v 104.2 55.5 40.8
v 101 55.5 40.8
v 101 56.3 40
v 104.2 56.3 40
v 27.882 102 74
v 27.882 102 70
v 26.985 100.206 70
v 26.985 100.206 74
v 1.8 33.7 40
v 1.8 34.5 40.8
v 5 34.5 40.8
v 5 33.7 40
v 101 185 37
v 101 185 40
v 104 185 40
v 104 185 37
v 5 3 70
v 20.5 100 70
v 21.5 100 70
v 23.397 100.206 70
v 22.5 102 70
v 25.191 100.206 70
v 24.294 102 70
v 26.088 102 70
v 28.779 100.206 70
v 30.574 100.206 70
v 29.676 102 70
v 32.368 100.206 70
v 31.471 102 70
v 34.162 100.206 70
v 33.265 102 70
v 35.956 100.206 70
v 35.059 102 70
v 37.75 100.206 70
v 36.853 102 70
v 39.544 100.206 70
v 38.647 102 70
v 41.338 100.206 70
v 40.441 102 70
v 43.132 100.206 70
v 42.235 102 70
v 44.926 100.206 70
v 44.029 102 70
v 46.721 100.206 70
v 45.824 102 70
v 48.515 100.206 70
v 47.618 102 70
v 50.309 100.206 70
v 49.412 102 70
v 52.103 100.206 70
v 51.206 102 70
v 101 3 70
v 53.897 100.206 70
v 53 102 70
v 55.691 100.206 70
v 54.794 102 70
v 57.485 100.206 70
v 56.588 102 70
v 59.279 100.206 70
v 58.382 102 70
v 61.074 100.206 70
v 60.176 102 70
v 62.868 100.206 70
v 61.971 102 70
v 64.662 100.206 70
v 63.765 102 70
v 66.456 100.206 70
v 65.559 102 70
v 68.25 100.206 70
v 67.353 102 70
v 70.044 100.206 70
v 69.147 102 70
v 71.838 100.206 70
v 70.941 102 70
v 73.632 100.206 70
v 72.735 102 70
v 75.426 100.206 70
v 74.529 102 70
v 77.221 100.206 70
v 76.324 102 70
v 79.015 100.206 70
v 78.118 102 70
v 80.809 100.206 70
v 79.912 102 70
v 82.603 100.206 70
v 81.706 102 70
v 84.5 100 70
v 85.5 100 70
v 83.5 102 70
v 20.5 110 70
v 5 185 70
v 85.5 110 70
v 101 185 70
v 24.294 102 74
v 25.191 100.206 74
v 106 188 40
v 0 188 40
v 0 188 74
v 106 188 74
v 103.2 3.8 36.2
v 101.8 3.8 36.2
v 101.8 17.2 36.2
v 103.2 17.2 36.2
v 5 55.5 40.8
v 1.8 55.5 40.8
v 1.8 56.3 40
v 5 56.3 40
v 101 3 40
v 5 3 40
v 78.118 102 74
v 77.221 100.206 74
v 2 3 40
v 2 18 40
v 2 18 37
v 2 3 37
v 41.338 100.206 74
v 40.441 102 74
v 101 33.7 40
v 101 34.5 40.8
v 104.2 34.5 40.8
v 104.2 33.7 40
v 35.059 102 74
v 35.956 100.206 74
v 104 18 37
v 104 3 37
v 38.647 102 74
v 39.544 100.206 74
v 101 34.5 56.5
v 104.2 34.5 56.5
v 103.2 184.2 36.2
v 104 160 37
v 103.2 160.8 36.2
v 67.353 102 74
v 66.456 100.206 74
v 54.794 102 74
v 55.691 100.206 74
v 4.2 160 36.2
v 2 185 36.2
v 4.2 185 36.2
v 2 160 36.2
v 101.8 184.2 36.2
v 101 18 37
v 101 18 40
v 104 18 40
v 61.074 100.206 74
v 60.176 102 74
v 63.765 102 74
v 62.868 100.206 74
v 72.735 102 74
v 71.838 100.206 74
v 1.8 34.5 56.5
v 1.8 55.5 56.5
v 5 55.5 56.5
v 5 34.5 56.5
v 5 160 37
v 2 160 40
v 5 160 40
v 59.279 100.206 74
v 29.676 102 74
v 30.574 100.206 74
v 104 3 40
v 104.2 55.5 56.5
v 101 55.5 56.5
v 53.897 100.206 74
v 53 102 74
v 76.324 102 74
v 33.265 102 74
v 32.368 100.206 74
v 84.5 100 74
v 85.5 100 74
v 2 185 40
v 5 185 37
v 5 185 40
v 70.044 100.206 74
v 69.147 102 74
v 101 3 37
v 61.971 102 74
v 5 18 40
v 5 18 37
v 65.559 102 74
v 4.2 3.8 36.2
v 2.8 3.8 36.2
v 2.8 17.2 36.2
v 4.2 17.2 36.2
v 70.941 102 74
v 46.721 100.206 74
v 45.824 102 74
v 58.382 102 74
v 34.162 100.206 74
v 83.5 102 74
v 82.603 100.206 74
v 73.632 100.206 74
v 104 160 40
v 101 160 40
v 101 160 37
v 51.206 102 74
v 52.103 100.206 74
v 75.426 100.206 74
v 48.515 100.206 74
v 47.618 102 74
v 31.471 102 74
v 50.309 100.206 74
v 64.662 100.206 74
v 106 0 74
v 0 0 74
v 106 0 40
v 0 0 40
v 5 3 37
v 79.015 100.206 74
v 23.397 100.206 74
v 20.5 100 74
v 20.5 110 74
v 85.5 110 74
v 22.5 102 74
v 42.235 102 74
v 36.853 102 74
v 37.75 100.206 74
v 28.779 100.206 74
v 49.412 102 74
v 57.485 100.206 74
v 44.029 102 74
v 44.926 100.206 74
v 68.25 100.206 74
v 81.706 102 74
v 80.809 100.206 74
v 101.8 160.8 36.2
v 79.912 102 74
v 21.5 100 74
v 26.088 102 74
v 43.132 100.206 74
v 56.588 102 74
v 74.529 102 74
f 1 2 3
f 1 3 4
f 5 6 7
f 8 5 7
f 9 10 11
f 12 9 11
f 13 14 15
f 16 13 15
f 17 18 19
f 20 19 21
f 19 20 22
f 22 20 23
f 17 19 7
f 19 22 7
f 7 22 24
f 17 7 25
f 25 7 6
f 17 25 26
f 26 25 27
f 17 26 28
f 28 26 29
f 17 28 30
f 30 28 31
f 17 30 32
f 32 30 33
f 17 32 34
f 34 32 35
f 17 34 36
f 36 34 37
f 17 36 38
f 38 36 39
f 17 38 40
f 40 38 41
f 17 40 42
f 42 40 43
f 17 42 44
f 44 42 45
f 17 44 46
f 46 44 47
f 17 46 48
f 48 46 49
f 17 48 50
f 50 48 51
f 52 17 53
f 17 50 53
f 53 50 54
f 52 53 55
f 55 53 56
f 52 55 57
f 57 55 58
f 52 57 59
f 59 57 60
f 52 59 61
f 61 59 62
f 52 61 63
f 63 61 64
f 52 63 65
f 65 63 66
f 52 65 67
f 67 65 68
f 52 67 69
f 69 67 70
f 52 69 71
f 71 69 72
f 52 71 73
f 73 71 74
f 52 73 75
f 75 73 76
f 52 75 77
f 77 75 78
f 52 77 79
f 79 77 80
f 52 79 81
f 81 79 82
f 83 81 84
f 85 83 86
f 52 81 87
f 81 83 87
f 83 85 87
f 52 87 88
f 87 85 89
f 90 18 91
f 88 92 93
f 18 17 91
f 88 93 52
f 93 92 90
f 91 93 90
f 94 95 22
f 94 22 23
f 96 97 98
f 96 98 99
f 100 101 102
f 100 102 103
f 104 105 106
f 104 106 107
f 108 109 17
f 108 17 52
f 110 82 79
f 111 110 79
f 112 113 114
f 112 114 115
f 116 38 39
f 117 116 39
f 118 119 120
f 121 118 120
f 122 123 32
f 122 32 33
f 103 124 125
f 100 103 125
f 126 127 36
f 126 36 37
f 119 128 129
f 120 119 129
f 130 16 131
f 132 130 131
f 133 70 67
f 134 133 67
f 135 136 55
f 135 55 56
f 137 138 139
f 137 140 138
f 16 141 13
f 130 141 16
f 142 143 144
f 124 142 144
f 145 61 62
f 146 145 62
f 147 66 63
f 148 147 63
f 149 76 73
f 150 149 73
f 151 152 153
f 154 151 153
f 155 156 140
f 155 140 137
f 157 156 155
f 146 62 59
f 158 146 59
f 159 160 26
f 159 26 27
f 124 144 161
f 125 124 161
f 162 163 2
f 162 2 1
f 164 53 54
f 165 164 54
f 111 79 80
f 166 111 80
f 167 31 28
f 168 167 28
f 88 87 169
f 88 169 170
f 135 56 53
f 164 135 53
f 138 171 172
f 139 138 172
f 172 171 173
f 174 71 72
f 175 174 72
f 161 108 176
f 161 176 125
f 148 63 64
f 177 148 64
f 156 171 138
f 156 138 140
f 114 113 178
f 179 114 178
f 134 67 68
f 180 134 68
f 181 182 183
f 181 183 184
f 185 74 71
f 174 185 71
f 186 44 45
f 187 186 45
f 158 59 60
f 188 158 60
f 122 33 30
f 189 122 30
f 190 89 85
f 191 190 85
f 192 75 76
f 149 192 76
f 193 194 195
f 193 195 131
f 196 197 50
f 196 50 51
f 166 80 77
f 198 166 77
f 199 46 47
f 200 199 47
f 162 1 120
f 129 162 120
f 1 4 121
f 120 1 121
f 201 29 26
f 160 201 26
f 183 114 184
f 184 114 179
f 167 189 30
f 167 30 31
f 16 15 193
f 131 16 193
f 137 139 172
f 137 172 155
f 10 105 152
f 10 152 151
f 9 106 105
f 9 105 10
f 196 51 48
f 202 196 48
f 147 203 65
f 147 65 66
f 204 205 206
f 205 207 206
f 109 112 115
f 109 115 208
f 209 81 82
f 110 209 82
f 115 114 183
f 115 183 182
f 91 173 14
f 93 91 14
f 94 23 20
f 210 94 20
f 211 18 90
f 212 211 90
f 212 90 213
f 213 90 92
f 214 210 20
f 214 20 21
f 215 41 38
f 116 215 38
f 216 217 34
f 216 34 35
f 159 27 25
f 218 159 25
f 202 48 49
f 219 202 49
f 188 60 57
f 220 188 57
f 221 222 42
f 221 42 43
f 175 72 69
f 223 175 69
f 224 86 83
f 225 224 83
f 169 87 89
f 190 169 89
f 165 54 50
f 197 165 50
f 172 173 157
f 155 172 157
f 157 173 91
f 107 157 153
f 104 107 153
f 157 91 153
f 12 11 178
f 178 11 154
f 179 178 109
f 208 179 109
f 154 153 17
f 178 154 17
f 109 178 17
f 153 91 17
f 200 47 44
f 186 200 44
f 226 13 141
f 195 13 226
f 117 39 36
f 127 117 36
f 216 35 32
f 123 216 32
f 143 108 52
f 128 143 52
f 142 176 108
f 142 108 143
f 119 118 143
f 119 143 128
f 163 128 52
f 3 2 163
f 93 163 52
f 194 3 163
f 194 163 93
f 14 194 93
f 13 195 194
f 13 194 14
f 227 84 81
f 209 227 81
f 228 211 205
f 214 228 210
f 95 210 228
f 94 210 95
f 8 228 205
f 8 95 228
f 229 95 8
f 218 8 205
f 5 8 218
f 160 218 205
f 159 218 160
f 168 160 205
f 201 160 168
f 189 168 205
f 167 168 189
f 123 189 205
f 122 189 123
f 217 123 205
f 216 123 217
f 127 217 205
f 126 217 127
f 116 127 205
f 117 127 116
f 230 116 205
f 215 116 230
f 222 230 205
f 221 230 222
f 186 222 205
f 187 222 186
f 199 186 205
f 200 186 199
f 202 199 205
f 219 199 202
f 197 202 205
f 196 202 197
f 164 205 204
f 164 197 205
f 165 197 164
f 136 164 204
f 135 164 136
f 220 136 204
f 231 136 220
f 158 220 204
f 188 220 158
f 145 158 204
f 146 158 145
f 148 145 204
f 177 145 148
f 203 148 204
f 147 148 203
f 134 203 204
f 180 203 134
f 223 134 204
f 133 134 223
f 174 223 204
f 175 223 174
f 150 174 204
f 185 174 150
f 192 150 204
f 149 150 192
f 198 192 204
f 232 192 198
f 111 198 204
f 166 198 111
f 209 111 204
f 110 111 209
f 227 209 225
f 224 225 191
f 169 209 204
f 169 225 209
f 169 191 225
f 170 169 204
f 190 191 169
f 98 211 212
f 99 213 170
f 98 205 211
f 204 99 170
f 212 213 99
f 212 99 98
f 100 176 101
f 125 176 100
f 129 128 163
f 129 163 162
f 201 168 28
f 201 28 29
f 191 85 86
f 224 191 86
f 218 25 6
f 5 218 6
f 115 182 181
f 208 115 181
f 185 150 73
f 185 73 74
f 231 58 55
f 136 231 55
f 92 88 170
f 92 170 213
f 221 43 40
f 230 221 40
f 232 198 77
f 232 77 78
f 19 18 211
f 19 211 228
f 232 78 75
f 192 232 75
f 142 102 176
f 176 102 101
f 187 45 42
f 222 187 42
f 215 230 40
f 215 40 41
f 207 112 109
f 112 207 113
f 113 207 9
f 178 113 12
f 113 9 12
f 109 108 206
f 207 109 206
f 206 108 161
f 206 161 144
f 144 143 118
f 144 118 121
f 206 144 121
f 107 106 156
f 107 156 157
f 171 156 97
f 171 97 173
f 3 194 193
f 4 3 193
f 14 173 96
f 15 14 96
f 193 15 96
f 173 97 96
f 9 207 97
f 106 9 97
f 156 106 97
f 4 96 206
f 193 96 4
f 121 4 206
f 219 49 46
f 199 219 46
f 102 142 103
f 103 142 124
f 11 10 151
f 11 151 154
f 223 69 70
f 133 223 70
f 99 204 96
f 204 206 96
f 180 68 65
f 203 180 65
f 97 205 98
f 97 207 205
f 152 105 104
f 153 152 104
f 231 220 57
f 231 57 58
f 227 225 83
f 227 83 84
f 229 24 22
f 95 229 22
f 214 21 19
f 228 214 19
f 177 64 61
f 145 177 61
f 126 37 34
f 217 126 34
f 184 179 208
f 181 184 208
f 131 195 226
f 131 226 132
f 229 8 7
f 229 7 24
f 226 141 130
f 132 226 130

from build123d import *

# Parameters (mm, degrees)
SKETCH016_W         = 106
SKETCH016_H         = 188
SKETCH016_W_2       = 96
SKETCH016_H_2       = 182
PAD010_DEPTH        = 30
SKETCH017_W         = 3
SKETCH017_H         = 15
SKETCH017_H_2       = 25
PAD011_DEPTH        = 3.8
SKETCH018_W         = 3.2
SKETCH018_H         = 21
SKETCH018_W_2       = 3.2000000001
POCKET006_DEPTH     = 16.5
SKETCH019_W         = 106
SKETCH019_H         = 188
SKETCH019_W_2       = 65
SKETCH019_H_2       = 10
PAD012_DEPTH        = 4
CHAMFER001_SIZE     = 0.8
CHAMFER002_SIZE     = 0.8
PAD013_DEPTH        = 4
LINEARPATTERN_COUNT = 35
LINEARPATTERN_PITCH = 1.7941176471


with BuildPart() as part:
    # Sketch016 → Pad010 (new body)
    with BuildSketch(Plane.XY):
        with Locations((53, 94)):
            Rectangle(SKETCH016_W, SKETCH016_H)
        with Locations((53, 94)):
            Rectangle(SKETCH016_W_2, SKETCH016_H_2, mode=Mode.SUBTRACT)
    extrude(amount=PAD010_DEPTH)

    # Sketch017 (on Face9 of Pad010) → Pad011 (join)
    with BuildSketch(Plane(origin=(0, 0, 0), x_dir=(1, 0, 0), z_dir=(0, 0, -1))):
        with Locations((3.5, -10.5)):
            Rectangle(SKETCH017_W, SKETCH017_H)
        with Locations((3.5, -172.5)):
            Rectangle(SKETCH017_W, SKETCH017_H_2)
        with Locations((102.5, -172.5)):
            Rectangle(SKETCH017_W, SKETCH017_H_2)
        with Locations((102.5, -10.5)):
            Rectangle(SKETCH017_W, SKETCH017_H)
    extrude(amount=PAD011_DEPTH)

    # Sketch018 (on Face4 of Pad011) → Pocket006 (cut)
    with BuildSketch(Plane(origin=(0, 0, 0), x_dir=(1, 0, 0), z_dir=(0, 0, -1))):
        with Locations((3.4, -45)):
            Rectangle(SKETCH018_W, SKETCH018_H)
        with Locations((102.6, -45)):
            Rectangle(SKETCH018_W_2, SKETCH018_H)
    extrude(amount=-POCKET006_DEPTH, mode=Mode.SUBTRACT)

    # Sketch019 (on Face5 of Pocket006) → Pad012 (join)
    with BuildSketch(Plane.XY.offset(30)):
        with Locations((53, 94)):
            Rectangle(SKETCH019_W, SKETCH019_H)
        with Locations((52.9999999999, 105)):
            Rectangle(SKETCH019_W_2, SKETCH019_H_2, mode=Mode.SUBTRACT)
    extrude(amount=PAD012_DEPTH)

    # Chamfer001
    chamfer001_edges = [part.edges().sort_by_distance(p)[0] for p in [
        (101, 10.5, -3.8),
        (102.5, 18, -3.8),
        (104, 10.5, -3.8),
        (102.5, 3, -3.8),
        (102.5, 185, -3.8),
        (104, 172.5, -3.8),
        (102.5, 160, -3.8),
        (101, 172.5, -3.8),
        (5, 172.5, -3.8),
        (3.5, 3, -3.8),
        (2, 10.5, -3.8),
        (3.5, 18, -3.8),
        (5, 10.5, -3.8),
    ]]
    chamfer(chamfer001_edges, length=CHAMFER001_SIZE)

    # Chamfer002
    chamfer002_edges = [part.edges().sort_by_distance(p)[0] for p in [
        (102.6, 55.5, 0),
        (102.6, 34.5, 0),
        (3.4, 34.5, 0),
        (3.4, 55.5, 0),
    ]]
    chamfer(chamfer002_edges, length=CHAMFER002_SIZE)

    # Sketch020 (on Face12 of Chamfer002) → Pad013 (join)
    with BuildSketch(Plane(origin=(0, 0, 30), x_dir=(1, 0, 0), z_dir=(0, 0, -1))):
        Polygon((84.4999999999, -100), (83.4999999999, -102), (82.4999999999, -100), align=None)
    pad013 = extrude(amount=-PAD013_DEPTH)

    # LinearPattern: Pad013 ×35
    with Locations(*[(-i * LINEARPATTERN_PITCH, 0, 0) for i in range(1, LINEARPATTERN_COUNT)]):
        add(pad013)


with BuildPart() as part_1:
    # Body003 placement: moved
    add(part.part.moved(Location((0, 0, 40))))


solid = part_1.part
